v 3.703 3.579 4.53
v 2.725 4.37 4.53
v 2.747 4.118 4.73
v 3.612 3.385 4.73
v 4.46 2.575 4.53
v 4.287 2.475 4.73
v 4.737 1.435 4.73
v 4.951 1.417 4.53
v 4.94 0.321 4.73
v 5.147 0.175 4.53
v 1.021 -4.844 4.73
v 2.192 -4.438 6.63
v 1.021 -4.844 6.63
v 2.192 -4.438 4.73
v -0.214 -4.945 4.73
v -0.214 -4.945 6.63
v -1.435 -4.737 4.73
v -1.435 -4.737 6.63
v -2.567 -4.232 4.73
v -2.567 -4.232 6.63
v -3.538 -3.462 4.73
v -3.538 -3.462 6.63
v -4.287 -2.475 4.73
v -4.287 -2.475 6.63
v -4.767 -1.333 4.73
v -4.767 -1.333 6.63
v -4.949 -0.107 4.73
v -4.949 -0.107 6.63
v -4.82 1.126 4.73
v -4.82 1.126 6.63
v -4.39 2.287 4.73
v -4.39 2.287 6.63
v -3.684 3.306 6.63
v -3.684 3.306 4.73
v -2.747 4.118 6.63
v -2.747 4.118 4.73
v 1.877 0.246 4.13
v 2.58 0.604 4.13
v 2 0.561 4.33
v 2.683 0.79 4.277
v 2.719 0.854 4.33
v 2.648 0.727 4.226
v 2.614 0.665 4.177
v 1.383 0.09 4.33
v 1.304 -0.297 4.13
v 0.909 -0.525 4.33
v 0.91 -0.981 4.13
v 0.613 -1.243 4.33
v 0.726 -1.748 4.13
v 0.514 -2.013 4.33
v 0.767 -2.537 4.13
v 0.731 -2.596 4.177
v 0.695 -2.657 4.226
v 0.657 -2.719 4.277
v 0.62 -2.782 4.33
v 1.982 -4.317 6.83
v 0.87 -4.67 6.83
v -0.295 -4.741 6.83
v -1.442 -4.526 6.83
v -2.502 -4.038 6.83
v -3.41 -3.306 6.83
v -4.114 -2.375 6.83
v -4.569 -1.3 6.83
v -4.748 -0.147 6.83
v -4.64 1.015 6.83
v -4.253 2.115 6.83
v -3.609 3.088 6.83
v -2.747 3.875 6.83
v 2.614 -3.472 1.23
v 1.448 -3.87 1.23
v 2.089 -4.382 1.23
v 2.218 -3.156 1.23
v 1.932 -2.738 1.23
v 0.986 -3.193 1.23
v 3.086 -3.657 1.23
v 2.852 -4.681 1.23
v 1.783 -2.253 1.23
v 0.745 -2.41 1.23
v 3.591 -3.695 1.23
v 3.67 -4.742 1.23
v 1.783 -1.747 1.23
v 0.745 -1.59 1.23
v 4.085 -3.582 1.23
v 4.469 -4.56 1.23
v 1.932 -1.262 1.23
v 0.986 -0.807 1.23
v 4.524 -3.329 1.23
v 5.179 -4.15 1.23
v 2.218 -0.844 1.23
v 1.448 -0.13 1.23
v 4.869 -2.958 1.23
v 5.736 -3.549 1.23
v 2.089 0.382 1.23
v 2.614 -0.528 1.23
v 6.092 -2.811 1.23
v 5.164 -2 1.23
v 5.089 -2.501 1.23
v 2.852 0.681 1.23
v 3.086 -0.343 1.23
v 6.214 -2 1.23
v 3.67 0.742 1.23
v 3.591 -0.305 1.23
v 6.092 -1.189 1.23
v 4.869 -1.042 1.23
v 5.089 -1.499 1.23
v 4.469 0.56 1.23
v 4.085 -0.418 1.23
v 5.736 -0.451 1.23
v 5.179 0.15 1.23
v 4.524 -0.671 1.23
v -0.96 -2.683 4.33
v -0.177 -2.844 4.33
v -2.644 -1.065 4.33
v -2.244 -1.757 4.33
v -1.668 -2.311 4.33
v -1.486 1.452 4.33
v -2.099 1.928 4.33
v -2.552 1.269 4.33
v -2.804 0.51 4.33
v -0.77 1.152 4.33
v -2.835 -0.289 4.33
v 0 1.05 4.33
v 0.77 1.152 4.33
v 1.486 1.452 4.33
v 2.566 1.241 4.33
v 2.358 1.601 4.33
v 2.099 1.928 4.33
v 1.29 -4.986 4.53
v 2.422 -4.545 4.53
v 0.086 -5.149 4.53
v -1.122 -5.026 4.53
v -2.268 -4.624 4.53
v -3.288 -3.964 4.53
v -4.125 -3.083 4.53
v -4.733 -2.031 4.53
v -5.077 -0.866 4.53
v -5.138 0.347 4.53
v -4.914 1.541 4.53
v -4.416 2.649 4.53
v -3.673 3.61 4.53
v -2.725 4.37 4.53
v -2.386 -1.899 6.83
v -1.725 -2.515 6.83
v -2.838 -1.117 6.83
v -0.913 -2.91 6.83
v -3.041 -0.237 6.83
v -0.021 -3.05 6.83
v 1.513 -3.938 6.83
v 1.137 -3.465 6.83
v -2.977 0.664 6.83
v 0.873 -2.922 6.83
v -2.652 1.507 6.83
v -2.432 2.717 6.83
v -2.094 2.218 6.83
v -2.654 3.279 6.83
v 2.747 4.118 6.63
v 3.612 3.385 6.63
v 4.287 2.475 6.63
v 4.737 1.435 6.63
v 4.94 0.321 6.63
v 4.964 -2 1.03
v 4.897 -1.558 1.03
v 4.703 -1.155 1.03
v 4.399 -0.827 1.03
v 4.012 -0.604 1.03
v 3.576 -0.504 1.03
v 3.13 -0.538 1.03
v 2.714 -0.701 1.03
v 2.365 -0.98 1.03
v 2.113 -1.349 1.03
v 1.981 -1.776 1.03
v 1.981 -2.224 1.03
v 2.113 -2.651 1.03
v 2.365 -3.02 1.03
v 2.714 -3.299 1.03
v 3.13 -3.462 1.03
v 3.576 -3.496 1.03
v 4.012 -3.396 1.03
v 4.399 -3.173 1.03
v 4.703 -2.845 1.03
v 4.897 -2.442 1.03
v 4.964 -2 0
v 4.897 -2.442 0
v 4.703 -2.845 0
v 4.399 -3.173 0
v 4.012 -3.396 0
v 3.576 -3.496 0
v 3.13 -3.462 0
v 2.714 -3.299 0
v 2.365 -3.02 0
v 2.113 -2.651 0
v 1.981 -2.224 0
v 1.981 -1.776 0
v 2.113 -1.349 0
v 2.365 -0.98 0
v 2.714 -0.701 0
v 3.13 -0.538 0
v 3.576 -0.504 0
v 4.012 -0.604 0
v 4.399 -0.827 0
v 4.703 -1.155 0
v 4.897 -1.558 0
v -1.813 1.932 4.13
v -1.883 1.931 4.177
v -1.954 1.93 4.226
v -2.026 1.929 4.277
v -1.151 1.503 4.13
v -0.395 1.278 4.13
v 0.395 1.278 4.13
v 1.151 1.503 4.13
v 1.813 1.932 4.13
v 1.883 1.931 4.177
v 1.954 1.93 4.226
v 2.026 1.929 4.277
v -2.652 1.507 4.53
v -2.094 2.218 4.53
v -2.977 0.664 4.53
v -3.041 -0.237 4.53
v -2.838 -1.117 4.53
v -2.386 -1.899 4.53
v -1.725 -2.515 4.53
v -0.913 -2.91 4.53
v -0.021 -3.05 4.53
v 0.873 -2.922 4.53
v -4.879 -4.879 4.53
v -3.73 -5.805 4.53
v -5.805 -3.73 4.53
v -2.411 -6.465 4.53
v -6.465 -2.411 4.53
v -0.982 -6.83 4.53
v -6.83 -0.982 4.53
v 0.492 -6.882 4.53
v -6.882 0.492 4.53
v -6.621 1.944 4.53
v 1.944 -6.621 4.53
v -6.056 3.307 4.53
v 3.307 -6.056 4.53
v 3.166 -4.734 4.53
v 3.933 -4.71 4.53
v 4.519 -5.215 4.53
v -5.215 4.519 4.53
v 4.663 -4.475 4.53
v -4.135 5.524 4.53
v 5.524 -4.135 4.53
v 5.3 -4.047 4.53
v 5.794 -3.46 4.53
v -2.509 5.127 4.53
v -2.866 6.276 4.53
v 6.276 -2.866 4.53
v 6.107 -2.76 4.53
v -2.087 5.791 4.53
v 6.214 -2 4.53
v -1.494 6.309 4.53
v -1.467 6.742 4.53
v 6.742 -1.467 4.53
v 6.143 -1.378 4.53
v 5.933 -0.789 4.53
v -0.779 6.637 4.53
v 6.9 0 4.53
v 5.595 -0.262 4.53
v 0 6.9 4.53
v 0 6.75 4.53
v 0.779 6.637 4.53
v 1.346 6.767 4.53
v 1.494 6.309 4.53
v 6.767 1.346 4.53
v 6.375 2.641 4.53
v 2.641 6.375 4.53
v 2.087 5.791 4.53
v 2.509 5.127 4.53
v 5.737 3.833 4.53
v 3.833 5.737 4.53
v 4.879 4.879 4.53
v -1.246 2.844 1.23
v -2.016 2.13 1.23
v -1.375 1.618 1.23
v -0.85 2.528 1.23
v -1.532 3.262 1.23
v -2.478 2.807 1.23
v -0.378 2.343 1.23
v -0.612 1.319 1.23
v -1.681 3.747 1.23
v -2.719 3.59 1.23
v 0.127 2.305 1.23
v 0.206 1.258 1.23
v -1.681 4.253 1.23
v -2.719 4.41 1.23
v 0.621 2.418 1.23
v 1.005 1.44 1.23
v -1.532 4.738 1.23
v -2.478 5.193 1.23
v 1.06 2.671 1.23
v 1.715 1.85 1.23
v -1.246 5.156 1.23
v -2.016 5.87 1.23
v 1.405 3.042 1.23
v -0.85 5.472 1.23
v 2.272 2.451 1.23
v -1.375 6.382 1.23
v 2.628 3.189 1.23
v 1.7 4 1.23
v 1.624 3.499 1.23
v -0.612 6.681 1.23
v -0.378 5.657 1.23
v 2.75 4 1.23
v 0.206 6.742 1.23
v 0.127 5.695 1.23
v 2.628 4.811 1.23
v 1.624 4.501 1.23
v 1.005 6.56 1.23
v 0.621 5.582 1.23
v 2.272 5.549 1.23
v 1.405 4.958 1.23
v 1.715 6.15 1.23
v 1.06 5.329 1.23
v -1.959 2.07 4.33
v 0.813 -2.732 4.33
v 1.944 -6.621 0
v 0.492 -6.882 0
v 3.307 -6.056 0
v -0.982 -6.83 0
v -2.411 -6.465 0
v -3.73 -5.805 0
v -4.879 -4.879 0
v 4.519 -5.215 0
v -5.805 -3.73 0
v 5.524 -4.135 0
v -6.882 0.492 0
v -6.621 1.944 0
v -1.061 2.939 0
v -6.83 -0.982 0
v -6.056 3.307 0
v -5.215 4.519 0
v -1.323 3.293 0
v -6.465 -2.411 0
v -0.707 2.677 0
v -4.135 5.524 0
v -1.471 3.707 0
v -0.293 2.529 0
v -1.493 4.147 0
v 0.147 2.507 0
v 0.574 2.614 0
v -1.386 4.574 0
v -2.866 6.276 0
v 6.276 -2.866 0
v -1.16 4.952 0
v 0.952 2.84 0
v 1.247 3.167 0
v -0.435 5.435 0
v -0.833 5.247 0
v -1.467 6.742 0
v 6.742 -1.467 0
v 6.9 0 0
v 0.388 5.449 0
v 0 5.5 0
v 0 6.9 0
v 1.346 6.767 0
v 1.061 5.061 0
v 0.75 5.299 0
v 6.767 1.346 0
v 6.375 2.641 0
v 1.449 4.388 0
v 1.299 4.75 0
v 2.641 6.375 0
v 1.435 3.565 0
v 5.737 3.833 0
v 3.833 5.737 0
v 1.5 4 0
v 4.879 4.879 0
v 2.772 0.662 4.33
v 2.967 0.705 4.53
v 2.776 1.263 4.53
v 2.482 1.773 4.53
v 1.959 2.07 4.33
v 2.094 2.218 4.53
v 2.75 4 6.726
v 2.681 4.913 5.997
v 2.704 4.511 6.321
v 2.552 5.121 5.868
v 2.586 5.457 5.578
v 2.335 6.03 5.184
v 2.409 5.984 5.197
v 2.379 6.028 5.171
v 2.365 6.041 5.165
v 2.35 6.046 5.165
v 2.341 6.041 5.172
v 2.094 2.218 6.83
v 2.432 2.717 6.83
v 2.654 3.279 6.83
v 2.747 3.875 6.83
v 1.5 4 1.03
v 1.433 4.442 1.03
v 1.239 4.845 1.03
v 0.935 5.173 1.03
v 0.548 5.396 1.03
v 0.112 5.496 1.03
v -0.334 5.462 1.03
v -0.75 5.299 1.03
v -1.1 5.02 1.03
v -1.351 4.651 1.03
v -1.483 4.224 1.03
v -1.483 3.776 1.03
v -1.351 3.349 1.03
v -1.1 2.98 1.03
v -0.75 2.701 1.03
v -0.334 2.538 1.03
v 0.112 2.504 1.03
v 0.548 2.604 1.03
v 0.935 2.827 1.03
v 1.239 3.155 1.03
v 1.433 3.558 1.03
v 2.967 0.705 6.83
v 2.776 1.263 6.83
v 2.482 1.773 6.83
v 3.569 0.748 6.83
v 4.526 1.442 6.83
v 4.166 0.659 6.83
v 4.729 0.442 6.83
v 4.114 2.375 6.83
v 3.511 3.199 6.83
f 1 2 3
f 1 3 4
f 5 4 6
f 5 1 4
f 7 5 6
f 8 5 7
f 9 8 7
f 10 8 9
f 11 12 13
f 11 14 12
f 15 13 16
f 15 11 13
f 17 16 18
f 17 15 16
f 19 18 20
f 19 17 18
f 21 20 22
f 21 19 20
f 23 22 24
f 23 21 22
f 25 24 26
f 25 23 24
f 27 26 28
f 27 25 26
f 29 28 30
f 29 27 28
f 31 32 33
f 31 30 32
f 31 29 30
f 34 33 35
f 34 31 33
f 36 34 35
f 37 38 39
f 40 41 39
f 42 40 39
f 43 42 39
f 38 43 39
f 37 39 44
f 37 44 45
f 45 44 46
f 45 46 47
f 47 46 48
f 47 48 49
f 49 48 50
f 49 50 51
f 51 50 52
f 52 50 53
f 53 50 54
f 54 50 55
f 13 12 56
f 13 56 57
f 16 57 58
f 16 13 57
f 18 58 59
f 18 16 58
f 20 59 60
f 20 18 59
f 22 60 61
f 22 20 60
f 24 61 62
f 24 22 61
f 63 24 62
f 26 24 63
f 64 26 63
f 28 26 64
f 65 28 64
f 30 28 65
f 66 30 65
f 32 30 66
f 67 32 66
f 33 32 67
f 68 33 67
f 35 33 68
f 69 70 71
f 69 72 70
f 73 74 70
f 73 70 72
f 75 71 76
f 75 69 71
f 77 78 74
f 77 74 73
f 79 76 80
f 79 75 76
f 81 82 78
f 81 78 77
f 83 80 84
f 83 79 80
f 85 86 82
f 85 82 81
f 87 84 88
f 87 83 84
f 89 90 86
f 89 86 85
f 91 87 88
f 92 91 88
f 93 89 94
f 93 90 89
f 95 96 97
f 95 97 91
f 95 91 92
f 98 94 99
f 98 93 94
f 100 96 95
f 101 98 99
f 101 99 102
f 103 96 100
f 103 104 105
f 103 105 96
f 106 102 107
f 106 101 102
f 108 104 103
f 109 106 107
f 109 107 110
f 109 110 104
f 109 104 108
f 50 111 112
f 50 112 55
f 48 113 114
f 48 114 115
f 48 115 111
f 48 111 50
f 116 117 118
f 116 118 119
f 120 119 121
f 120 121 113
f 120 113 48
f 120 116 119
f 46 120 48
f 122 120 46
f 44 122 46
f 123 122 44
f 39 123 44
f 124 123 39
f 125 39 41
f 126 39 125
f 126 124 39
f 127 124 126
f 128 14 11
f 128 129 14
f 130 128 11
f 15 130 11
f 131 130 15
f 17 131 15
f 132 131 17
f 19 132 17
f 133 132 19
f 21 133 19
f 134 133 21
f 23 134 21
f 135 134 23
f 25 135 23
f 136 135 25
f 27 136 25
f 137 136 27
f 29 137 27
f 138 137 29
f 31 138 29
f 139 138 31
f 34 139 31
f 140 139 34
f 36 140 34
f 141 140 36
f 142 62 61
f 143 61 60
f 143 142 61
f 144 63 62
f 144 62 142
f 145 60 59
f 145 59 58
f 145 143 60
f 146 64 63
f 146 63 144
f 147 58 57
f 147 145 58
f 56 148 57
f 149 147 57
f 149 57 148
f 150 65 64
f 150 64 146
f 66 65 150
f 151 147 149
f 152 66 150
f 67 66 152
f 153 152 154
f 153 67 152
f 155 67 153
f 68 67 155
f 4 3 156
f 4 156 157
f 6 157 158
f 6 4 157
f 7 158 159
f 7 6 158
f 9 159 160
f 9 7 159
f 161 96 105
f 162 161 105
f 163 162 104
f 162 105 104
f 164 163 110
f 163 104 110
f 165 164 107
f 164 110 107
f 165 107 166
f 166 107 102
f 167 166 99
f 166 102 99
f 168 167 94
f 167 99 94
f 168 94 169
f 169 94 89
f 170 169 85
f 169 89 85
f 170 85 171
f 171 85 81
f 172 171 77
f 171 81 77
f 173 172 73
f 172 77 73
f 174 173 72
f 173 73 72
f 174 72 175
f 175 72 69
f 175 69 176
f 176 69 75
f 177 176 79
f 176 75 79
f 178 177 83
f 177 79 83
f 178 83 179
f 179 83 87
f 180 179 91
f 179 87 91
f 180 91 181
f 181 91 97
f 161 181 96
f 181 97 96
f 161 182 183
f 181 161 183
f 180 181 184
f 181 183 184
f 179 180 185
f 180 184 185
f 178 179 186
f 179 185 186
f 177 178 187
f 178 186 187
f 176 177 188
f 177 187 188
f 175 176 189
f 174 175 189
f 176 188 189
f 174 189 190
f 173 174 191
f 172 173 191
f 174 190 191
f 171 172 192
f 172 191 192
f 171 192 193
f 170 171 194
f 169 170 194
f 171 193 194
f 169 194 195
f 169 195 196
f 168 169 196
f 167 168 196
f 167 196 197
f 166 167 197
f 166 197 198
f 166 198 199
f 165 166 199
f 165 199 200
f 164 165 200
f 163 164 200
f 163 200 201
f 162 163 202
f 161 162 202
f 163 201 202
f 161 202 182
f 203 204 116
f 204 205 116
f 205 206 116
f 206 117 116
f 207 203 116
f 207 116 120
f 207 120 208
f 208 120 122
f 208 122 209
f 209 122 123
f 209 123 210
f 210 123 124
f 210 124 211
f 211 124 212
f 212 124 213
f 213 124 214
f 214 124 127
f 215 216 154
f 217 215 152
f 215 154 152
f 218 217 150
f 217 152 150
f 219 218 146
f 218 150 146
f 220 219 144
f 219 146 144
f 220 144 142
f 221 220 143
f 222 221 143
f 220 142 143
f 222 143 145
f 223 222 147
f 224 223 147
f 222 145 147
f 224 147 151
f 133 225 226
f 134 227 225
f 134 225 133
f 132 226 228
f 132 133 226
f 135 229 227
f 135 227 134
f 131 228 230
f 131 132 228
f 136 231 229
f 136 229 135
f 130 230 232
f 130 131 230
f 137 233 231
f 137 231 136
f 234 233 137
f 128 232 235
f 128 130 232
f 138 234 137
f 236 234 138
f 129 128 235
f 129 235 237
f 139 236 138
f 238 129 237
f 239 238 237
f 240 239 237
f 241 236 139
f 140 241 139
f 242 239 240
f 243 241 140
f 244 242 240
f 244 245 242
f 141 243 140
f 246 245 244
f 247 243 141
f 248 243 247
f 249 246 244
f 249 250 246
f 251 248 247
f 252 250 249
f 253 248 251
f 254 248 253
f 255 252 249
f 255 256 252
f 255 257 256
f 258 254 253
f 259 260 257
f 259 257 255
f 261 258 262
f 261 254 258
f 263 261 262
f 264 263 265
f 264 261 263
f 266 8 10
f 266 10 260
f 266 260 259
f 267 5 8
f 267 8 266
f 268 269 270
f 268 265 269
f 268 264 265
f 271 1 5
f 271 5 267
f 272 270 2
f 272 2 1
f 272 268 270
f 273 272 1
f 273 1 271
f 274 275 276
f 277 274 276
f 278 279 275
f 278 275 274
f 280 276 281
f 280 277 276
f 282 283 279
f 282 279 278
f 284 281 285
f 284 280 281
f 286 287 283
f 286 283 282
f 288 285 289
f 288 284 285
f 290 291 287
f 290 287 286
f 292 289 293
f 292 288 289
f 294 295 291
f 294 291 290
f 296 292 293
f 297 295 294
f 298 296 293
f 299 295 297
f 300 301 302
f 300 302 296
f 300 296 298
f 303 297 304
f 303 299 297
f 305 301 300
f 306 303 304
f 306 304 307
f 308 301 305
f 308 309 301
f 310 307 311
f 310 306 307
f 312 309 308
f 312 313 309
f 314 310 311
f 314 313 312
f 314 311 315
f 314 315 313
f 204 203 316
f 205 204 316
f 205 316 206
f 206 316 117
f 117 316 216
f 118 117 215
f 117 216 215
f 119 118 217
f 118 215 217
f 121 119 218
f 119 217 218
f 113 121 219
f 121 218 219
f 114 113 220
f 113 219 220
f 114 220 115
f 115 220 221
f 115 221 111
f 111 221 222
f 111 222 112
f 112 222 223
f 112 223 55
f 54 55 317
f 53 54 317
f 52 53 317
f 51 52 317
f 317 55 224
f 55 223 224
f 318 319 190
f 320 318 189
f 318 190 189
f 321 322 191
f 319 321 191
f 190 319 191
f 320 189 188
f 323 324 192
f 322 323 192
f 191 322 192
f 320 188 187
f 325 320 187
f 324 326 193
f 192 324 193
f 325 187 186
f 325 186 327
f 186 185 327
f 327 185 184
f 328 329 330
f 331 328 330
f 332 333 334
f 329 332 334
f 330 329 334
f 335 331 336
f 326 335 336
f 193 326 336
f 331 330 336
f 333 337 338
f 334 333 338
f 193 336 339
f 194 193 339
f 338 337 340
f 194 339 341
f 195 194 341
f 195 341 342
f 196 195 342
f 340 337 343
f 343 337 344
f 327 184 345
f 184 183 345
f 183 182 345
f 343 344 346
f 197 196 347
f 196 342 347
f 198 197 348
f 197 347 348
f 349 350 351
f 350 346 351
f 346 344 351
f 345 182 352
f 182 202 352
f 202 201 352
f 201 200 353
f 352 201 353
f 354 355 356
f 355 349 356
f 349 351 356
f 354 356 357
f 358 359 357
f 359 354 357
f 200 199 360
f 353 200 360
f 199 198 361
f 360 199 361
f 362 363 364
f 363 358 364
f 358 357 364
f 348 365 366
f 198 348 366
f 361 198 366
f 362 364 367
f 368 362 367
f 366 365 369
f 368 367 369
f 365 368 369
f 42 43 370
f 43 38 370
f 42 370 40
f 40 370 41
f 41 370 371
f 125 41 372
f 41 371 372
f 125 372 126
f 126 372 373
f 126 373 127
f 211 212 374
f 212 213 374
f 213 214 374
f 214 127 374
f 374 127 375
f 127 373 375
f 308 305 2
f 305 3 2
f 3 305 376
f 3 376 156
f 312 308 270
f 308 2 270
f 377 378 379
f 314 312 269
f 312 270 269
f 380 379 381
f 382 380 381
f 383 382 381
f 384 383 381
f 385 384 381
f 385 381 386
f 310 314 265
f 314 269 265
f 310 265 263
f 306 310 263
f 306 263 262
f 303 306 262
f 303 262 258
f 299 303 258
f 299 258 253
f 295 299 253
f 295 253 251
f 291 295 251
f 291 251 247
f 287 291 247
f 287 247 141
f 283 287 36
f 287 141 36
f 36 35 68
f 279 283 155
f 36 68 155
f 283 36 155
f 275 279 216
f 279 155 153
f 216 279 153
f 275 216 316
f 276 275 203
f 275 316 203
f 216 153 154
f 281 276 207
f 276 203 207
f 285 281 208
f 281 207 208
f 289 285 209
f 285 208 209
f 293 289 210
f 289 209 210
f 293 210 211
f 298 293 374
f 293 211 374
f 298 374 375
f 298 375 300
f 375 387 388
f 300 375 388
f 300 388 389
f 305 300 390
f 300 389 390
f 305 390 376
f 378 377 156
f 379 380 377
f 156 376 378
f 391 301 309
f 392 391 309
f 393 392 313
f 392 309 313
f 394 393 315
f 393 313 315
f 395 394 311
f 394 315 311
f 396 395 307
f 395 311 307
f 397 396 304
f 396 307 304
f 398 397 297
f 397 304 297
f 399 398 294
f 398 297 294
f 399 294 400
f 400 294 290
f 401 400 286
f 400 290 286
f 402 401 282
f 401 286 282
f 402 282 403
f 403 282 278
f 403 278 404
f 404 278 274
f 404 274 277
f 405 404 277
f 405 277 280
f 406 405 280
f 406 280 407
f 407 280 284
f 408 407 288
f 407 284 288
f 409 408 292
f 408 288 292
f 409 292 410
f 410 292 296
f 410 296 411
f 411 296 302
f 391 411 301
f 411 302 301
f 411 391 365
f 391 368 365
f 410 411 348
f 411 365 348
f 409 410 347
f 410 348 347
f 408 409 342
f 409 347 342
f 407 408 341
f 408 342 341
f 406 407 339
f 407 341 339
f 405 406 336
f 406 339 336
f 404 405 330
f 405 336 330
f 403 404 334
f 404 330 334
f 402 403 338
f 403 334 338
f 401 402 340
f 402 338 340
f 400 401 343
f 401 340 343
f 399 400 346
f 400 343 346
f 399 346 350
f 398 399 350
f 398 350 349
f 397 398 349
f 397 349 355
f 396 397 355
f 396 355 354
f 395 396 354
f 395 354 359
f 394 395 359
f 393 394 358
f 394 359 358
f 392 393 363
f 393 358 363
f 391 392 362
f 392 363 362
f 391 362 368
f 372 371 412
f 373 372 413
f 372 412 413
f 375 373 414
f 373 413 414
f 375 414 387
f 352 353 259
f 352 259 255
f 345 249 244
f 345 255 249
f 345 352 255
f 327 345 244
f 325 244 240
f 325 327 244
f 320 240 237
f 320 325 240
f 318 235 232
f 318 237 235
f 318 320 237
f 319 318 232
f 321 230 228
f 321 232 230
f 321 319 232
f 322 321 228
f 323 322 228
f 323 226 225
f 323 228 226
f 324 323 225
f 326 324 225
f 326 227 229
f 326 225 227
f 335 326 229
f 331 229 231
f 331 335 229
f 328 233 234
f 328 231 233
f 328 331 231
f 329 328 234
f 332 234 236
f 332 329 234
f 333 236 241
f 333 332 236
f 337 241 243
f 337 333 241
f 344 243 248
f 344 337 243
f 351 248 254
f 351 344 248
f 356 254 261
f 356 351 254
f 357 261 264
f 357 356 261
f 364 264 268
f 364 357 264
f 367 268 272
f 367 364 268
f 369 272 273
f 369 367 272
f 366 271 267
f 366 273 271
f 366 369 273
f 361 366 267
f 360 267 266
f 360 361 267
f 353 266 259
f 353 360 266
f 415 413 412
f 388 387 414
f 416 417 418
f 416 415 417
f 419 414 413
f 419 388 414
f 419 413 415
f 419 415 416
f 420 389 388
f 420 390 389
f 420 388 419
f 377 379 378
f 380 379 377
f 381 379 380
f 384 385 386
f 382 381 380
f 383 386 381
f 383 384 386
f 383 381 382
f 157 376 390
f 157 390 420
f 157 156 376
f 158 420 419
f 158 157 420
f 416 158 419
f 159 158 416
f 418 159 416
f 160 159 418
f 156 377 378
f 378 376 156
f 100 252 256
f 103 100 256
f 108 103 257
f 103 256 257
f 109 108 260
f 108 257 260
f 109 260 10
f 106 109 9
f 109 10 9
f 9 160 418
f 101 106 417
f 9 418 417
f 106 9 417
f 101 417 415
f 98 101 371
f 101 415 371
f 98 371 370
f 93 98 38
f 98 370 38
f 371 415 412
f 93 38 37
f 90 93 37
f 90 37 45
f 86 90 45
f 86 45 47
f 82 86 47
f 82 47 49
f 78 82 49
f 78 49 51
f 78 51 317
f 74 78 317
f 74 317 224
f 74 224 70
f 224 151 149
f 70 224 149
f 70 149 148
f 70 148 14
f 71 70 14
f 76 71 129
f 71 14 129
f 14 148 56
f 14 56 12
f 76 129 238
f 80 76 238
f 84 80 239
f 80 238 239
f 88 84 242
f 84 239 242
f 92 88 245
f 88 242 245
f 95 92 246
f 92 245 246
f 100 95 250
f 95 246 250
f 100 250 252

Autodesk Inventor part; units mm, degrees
ref_plane "YZ Plane" through (0, 0, 0) normal (1, 0, 0) x (0, 1, 0)
ref_plane "XZ Plane" through (0, 0, 0) normal (0, 1, 0) x (-1, 0, 0)
ref_plane "XY Plane" through (0, 0, 0) normal (0, 0, 1) x (1, 0, 0)
sketch "Sketch1" plane through (0, 0, 0) normal (0, 0, 1) x (1, 0, 0)
  circle A0 centre (0, 0) radius 6.9
  line L0 (0, 0) -> (0, 9.7668)
  circle A1 centre (0, 0) radius 4
  circle A2 centre (0, 4) radius 1.5
  circle A3 centre (-3.4641, -2) radius 1.5
  circle A4 centre (3.4641, -2) radius 1.5
  dimension "d1" = 8
  dimension "d0" = 13.8
  dimension "d2" = 3
  dimension "d5" = 360
extrude "Extrusion1" add sketch "Sketch1" along normal blind 4.53 contours A0 | A2 A1 A4 A3 | A3 A1 | A1 A3
sketch "Sketch2" plane through (0, 0, 4.53) normal (0, 0, 1) x (1, 0, 0)
  circle A0 centre (0, 0) radius 4.95
  dimension "d9" = 9.9
extrude "Extrusion2" add sketch "Sketch2" along normal blind 2.3
sketch "Sketch3" plane through (0, 0, 6.83) normal (0, 0, 1) x (1, 0, 0)
  circle A0 centre (0, 0) radius 3.05
  dimension "d12" = 6.1
extrude "Extrusion3" cut sketch "Sketch3" against normal blind 2.5
sketch "Sketch4" plane through (0, 0, 6.83) normal (0, 0, 1) x (1, 0, 0)
  arc A0 (1.2803, 4.7816) -> (-1.2803, 4.7816) centre (0, 4) ccw projected
  circle A1 centre (0, 4) radius 2.75
  circle A2 centre (-3.4641, -2) radius 2.75
  circle A3 centre (3.4641, -2) radius 2.75
  point P0 (0, 0)
  dimension "d15" = 5.5
  dimension "d18" = 360
extrude "Extrusion4" cut sketch "Sketch4" against normal blind 5.6 contours A1 | A3
chamfer "Chamfer1" distance 0.2 angle 45 2 edges at (2.6414, 1.525, 4.33) (-2.6414, -1.525, 4.33)
chamfer "Chamfer2" distance 0.2 angle 45 2 edges at (4.2868, 2.475, 6.83) (-4.2868, -2.475, 6.83)
chamfer "Chamfer3" distance 0.2 angle 45 4 edges at (-1.5, 4, 1.23) (0, 1.25, 4.33) (1.0825, -0.625, 4.33) (1.9641, -2, 1.23)
chamfer "Chamfer4" distance 0.2 angle 45 2 edges at (4.2868, 2.475, 4.53) (-4.2868, -2.475, 4.53)
properties part number "acc_motor_maghold"
